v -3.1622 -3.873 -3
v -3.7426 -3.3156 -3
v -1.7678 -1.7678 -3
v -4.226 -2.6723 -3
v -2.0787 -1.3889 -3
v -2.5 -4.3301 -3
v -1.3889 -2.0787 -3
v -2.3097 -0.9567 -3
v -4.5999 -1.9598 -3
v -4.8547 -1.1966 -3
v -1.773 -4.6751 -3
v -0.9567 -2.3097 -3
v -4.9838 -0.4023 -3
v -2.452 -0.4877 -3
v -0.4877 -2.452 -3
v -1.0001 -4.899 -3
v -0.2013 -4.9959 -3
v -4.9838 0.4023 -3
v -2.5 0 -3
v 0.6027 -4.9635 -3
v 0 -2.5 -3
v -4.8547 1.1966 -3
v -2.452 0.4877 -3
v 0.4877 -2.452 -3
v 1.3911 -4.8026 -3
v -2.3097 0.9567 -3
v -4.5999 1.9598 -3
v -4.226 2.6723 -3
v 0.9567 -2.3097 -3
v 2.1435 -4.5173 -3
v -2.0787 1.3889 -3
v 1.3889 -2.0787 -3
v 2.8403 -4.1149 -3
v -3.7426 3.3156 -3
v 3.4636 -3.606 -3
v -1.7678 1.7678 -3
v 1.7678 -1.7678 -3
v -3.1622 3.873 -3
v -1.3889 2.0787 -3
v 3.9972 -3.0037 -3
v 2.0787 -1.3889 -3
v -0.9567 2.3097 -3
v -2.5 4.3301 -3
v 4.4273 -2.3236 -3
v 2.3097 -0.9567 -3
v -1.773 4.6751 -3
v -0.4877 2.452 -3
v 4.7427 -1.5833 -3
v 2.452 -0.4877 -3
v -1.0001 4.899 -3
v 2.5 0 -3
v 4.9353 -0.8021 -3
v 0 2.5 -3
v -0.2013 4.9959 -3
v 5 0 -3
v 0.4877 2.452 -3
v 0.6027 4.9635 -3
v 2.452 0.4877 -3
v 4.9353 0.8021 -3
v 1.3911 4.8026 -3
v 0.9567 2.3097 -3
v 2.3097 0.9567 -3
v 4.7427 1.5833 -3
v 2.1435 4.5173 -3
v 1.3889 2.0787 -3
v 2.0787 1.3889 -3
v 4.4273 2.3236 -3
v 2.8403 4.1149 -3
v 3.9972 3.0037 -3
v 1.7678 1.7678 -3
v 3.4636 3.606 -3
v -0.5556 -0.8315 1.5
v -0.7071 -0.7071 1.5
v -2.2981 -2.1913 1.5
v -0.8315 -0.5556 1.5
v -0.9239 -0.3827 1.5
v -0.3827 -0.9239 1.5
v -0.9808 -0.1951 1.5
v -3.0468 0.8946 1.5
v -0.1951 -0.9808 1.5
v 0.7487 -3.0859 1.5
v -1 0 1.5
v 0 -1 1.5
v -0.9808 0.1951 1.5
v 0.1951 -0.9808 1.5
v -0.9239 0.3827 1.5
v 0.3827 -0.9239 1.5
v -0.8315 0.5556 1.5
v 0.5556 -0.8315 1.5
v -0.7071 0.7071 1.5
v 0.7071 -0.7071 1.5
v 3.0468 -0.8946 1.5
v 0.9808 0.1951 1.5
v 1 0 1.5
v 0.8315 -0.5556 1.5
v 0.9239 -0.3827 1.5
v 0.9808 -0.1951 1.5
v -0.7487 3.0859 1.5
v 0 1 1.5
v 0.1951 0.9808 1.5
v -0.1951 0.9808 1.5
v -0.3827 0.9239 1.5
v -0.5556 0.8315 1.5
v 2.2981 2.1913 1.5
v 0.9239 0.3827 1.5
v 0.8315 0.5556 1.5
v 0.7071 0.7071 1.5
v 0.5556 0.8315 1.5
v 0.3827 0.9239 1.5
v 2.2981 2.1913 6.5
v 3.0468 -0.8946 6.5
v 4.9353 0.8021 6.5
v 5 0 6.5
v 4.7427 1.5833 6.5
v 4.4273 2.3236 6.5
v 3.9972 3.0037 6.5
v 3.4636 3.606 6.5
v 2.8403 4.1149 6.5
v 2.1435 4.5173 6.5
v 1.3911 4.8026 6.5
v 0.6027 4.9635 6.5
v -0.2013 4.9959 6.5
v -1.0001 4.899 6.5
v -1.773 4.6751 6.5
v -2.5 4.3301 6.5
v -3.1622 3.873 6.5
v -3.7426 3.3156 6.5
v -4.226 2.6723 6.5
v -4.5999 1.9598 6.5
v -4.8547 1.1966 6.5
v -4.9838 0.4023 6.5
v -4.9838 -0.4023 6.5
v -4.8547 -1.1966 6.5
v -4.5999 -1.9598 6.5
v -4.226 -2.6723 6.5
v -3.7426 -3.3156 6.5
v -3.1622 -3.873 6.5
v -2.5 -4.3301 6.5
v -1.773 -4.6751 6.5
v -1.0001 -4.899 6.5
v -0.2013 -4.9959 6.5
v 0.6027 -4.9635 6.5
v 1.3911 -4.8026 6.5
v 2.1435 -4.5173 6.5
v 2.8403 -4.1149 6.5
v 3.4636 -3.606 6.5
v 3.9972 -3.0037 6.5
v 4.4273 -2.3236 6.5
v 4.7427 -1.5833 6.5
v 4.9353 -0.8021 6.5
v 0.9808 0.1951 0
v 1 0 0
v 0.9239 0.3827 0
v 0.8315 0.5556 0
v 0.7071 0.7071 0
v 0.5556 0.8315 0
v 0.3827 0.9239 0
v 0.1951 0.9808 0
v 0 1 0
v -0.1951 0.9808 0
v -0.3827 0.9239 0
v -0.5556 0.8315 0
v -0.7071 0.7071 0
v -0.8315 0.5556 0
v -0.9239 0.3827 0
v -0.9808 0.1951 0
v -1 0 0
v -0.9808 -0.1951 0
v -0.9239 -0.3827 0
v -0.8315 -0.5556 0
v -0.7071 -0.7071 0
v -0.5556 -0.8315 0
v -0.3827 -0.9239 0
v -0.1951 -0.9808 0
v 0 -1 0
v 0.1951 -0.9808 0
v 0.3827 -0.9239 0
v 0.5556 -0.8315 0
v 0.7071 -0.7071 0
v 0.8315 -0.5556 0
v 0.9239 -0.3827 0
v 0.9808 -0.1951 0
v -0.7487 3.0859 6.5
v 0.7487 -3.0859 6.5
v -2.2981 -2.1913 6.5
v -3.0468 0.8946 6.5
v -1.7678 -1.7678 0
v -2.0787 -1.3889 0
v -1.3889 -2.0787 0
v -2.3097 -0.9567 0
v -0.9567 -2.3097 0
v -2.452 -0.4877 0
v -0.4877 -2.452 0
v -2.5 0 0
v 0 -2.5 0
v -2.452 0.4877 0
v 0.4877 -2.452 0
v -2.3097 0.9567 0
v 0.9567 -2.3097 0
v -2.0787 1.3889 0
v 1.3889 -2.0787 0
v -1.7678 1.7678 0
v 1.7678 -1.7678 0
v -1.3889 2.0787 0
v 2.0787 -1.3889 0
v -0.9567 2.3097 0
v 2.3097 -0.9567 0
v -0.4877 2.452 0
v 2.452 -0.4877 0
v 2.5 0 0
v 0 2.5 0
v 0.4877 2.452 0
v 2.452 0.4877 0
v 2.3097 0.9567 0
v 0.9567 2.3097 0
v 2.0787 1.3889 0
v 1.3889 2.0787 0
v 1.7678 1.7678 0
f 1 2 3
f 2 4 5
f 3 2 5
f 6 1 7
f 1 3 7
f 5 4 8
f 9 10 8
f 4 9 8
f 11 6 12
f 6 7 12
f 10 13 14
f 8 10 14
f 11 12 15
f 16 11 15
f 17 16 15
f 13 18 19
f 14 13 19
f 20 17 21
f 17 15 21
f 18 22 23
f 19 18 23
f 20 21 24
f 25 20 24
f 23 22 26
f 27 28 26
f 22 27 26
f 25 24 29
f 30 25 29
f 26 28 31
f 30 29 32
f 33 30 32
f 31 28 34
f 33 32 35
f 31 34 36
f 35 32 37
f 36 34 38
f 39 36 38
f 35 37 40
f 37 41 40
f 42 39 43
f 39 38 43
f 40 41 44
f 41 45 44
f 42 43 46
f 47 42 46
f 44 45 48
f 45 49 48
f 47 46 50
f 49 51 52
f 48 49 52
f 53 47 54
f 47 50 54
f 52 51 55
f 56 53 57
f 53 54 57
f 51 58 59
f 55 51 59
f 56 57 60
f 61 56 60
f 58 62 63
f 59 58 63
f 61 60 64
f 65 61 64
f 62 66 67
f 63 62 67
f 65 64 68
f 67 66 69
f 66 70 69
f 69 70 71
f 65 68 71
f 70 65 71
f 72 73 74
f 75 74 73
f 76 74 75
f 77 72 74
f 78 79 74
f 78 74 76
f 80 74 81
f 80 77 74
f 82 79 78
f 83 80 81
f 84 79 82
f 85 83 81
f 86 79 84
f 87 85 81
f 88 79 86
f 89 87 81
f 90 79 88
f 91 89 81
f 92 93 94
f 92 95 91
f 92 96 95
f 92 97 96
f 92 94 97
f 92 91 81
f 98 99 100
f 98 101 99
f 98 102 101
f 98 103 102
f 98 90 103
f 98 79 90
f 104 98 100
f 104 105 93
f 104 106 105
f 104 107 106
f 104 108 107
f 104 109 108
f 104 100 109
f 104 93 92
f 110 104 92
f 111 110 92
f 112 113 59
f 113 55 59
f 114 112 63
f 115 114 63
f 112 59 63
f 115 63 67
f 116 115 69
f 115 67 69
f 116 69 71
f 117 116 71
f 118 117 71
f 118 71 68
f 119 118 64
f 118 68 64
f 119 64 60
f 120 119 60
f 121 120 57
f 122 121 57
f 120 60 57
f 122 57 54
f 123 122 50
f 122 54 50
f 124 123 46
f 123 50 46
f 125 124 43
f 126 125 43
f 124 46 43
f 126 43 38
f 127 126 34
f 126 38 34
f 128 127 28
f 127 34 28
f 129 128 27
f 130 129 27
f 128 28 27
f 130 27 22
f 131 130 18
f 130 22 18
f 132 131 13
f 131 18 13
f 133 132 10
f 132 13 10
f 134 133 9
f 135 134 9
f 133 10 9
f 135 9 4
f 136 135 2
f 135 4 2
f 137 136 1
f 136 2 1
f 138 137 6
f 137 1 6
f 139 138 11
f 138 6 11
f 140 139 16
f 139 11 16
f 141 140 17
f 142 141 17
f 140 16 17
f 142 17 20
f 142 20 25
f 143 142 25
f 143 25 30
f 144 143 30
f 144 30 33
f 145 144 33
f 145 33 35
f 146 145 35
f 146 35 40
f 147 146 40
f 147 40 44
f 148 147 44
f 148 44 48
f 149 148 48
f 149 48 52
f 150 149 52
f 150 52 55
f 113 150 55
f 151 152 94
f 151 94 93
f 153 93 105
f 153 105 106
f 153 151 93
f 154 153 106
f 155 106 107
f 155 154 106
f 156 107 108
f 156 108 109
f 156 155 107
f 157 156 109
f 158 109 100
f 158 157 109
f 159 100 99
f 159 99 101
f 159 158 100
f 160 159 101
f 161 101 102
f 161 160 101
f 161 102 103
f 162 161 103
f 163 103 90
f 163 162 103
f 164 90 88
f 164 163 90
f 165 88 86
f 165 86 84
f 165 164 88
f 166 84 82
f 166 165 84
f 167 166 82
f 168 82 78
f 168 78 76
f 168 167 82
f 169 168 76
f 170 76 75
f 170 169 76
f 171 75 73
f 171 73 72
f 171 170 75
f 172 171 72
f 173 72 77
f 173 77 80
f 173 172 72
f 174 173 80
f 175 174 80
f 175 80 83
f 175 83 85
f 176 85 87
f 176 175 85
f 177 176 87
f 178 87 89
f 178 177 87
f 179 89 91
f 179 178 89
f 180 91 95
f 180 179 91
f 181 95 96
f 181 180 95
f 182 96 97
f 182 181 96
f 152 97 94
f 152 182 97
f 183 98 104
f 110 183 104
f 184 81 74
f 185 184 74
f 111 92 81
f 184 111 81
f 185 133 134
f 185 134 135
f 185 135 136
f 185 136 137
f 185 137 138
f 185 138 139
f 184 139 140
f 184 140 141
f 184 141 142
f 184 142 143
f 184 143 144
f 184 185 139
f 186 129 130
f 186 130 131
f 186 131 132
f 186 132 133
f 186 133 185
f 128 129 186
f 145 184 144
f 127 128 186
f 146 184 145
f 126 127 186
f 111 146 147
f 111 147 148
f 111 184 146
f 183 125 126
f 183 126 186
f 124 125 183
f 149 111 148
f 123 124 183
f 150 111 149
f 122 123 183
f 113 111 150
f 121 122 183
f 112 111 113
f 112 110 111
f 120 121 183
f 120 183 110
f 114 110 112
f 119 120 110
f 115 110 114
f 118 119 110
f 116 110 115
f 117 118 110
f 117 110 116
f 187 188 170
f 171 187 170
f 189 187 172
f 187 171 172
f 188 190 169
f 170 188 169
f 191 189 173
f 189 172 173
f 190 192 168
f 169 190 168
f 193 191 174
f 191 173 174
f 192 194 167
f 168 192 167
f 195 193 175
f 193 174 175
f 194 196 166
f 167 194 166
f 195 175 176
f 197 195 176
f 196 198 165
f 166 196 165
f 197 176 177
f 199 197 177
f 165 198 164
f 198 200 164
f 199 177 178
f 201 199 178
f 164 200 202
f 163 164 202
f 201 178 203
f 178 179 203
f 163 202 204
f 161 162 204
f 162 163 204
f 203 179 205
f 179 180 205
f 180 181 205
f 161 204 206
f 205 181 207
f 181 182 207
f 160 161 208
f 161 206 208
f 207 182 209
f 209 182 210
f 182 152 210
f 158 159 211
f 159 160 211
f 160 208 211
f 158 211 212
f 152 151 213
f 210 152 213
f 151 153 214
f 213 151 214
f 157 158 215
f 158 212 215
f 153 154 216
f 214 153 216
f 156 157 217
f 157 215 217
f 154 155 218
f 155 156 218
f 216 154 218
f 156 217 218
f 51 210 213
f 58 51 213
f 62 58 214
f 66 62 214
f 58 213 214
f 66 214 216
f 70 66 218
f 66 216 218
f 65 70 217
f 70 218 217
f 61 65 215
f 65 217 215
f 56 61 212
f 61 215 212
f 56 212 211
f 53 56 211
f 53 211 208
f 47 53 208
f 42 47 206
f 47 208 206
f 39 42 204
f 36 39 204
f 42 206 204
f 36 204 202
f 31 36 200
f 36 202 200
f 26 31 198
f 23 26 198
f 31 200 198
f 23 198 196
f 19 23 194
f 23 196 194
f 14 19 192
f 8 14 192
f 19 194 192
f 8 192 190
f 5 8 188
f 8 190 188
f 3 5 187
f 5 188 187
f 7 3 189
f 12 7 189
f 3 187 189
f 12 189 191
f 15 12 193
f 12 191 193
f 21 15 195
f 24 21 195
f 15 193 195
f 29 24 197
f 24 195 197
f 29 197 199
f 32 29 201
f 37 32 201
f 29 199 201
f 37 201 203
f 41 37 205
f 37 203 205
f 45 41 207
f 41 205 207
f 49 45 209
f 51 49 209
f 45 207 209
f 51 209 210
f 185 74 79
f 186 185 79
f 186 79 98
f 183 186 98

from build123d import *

# Parameters (mm, degrees)
F0_R     = 5
F0_R_2   = 2.5
F0_R_3   = 1
F1_DEPTH = 1.5
F2_DEPTH = 3
F3_R     = 5
F4_DEPTH = 5


with BuildPart() as f1:
    # F0 (on Top) → F1 (new body)
    with BuildSketch(Plane.XY):
        Circle(F0_R)
        Circle(F0_R_2, mode=Mode.SUBTRACT)
        Circle(F0_R_2)
        Circle(F0_R_3, mode=Mode.SUBTRACT)
    extrude(amount=F1_DEPTH)

    # F0 (on Top) → F2 (join)
    with BuildSketch(Plane.XY):
        Circle(F0_R)
        Circle(F0_R_2, mode=Mode.SUBTRACT)
    extrude(amount=-F2_DEPTH)

    # F3 (on face) → F4 (join)
    with BuildSketch(Plane.XY.offset(1.5)):
        Circle(F3_R)
        Polygon((-3.046816, 0.894564), (-0.748693, 3.085902), (2.298123, 2.191338), (3.046816, -0.894564), (0.748693, -3.085902), (-2.298123, -2.191338), align=None, mode=Mode.SUBTRACT)
    extrude(amount=F4_DEPTH)


solid = f1.part
